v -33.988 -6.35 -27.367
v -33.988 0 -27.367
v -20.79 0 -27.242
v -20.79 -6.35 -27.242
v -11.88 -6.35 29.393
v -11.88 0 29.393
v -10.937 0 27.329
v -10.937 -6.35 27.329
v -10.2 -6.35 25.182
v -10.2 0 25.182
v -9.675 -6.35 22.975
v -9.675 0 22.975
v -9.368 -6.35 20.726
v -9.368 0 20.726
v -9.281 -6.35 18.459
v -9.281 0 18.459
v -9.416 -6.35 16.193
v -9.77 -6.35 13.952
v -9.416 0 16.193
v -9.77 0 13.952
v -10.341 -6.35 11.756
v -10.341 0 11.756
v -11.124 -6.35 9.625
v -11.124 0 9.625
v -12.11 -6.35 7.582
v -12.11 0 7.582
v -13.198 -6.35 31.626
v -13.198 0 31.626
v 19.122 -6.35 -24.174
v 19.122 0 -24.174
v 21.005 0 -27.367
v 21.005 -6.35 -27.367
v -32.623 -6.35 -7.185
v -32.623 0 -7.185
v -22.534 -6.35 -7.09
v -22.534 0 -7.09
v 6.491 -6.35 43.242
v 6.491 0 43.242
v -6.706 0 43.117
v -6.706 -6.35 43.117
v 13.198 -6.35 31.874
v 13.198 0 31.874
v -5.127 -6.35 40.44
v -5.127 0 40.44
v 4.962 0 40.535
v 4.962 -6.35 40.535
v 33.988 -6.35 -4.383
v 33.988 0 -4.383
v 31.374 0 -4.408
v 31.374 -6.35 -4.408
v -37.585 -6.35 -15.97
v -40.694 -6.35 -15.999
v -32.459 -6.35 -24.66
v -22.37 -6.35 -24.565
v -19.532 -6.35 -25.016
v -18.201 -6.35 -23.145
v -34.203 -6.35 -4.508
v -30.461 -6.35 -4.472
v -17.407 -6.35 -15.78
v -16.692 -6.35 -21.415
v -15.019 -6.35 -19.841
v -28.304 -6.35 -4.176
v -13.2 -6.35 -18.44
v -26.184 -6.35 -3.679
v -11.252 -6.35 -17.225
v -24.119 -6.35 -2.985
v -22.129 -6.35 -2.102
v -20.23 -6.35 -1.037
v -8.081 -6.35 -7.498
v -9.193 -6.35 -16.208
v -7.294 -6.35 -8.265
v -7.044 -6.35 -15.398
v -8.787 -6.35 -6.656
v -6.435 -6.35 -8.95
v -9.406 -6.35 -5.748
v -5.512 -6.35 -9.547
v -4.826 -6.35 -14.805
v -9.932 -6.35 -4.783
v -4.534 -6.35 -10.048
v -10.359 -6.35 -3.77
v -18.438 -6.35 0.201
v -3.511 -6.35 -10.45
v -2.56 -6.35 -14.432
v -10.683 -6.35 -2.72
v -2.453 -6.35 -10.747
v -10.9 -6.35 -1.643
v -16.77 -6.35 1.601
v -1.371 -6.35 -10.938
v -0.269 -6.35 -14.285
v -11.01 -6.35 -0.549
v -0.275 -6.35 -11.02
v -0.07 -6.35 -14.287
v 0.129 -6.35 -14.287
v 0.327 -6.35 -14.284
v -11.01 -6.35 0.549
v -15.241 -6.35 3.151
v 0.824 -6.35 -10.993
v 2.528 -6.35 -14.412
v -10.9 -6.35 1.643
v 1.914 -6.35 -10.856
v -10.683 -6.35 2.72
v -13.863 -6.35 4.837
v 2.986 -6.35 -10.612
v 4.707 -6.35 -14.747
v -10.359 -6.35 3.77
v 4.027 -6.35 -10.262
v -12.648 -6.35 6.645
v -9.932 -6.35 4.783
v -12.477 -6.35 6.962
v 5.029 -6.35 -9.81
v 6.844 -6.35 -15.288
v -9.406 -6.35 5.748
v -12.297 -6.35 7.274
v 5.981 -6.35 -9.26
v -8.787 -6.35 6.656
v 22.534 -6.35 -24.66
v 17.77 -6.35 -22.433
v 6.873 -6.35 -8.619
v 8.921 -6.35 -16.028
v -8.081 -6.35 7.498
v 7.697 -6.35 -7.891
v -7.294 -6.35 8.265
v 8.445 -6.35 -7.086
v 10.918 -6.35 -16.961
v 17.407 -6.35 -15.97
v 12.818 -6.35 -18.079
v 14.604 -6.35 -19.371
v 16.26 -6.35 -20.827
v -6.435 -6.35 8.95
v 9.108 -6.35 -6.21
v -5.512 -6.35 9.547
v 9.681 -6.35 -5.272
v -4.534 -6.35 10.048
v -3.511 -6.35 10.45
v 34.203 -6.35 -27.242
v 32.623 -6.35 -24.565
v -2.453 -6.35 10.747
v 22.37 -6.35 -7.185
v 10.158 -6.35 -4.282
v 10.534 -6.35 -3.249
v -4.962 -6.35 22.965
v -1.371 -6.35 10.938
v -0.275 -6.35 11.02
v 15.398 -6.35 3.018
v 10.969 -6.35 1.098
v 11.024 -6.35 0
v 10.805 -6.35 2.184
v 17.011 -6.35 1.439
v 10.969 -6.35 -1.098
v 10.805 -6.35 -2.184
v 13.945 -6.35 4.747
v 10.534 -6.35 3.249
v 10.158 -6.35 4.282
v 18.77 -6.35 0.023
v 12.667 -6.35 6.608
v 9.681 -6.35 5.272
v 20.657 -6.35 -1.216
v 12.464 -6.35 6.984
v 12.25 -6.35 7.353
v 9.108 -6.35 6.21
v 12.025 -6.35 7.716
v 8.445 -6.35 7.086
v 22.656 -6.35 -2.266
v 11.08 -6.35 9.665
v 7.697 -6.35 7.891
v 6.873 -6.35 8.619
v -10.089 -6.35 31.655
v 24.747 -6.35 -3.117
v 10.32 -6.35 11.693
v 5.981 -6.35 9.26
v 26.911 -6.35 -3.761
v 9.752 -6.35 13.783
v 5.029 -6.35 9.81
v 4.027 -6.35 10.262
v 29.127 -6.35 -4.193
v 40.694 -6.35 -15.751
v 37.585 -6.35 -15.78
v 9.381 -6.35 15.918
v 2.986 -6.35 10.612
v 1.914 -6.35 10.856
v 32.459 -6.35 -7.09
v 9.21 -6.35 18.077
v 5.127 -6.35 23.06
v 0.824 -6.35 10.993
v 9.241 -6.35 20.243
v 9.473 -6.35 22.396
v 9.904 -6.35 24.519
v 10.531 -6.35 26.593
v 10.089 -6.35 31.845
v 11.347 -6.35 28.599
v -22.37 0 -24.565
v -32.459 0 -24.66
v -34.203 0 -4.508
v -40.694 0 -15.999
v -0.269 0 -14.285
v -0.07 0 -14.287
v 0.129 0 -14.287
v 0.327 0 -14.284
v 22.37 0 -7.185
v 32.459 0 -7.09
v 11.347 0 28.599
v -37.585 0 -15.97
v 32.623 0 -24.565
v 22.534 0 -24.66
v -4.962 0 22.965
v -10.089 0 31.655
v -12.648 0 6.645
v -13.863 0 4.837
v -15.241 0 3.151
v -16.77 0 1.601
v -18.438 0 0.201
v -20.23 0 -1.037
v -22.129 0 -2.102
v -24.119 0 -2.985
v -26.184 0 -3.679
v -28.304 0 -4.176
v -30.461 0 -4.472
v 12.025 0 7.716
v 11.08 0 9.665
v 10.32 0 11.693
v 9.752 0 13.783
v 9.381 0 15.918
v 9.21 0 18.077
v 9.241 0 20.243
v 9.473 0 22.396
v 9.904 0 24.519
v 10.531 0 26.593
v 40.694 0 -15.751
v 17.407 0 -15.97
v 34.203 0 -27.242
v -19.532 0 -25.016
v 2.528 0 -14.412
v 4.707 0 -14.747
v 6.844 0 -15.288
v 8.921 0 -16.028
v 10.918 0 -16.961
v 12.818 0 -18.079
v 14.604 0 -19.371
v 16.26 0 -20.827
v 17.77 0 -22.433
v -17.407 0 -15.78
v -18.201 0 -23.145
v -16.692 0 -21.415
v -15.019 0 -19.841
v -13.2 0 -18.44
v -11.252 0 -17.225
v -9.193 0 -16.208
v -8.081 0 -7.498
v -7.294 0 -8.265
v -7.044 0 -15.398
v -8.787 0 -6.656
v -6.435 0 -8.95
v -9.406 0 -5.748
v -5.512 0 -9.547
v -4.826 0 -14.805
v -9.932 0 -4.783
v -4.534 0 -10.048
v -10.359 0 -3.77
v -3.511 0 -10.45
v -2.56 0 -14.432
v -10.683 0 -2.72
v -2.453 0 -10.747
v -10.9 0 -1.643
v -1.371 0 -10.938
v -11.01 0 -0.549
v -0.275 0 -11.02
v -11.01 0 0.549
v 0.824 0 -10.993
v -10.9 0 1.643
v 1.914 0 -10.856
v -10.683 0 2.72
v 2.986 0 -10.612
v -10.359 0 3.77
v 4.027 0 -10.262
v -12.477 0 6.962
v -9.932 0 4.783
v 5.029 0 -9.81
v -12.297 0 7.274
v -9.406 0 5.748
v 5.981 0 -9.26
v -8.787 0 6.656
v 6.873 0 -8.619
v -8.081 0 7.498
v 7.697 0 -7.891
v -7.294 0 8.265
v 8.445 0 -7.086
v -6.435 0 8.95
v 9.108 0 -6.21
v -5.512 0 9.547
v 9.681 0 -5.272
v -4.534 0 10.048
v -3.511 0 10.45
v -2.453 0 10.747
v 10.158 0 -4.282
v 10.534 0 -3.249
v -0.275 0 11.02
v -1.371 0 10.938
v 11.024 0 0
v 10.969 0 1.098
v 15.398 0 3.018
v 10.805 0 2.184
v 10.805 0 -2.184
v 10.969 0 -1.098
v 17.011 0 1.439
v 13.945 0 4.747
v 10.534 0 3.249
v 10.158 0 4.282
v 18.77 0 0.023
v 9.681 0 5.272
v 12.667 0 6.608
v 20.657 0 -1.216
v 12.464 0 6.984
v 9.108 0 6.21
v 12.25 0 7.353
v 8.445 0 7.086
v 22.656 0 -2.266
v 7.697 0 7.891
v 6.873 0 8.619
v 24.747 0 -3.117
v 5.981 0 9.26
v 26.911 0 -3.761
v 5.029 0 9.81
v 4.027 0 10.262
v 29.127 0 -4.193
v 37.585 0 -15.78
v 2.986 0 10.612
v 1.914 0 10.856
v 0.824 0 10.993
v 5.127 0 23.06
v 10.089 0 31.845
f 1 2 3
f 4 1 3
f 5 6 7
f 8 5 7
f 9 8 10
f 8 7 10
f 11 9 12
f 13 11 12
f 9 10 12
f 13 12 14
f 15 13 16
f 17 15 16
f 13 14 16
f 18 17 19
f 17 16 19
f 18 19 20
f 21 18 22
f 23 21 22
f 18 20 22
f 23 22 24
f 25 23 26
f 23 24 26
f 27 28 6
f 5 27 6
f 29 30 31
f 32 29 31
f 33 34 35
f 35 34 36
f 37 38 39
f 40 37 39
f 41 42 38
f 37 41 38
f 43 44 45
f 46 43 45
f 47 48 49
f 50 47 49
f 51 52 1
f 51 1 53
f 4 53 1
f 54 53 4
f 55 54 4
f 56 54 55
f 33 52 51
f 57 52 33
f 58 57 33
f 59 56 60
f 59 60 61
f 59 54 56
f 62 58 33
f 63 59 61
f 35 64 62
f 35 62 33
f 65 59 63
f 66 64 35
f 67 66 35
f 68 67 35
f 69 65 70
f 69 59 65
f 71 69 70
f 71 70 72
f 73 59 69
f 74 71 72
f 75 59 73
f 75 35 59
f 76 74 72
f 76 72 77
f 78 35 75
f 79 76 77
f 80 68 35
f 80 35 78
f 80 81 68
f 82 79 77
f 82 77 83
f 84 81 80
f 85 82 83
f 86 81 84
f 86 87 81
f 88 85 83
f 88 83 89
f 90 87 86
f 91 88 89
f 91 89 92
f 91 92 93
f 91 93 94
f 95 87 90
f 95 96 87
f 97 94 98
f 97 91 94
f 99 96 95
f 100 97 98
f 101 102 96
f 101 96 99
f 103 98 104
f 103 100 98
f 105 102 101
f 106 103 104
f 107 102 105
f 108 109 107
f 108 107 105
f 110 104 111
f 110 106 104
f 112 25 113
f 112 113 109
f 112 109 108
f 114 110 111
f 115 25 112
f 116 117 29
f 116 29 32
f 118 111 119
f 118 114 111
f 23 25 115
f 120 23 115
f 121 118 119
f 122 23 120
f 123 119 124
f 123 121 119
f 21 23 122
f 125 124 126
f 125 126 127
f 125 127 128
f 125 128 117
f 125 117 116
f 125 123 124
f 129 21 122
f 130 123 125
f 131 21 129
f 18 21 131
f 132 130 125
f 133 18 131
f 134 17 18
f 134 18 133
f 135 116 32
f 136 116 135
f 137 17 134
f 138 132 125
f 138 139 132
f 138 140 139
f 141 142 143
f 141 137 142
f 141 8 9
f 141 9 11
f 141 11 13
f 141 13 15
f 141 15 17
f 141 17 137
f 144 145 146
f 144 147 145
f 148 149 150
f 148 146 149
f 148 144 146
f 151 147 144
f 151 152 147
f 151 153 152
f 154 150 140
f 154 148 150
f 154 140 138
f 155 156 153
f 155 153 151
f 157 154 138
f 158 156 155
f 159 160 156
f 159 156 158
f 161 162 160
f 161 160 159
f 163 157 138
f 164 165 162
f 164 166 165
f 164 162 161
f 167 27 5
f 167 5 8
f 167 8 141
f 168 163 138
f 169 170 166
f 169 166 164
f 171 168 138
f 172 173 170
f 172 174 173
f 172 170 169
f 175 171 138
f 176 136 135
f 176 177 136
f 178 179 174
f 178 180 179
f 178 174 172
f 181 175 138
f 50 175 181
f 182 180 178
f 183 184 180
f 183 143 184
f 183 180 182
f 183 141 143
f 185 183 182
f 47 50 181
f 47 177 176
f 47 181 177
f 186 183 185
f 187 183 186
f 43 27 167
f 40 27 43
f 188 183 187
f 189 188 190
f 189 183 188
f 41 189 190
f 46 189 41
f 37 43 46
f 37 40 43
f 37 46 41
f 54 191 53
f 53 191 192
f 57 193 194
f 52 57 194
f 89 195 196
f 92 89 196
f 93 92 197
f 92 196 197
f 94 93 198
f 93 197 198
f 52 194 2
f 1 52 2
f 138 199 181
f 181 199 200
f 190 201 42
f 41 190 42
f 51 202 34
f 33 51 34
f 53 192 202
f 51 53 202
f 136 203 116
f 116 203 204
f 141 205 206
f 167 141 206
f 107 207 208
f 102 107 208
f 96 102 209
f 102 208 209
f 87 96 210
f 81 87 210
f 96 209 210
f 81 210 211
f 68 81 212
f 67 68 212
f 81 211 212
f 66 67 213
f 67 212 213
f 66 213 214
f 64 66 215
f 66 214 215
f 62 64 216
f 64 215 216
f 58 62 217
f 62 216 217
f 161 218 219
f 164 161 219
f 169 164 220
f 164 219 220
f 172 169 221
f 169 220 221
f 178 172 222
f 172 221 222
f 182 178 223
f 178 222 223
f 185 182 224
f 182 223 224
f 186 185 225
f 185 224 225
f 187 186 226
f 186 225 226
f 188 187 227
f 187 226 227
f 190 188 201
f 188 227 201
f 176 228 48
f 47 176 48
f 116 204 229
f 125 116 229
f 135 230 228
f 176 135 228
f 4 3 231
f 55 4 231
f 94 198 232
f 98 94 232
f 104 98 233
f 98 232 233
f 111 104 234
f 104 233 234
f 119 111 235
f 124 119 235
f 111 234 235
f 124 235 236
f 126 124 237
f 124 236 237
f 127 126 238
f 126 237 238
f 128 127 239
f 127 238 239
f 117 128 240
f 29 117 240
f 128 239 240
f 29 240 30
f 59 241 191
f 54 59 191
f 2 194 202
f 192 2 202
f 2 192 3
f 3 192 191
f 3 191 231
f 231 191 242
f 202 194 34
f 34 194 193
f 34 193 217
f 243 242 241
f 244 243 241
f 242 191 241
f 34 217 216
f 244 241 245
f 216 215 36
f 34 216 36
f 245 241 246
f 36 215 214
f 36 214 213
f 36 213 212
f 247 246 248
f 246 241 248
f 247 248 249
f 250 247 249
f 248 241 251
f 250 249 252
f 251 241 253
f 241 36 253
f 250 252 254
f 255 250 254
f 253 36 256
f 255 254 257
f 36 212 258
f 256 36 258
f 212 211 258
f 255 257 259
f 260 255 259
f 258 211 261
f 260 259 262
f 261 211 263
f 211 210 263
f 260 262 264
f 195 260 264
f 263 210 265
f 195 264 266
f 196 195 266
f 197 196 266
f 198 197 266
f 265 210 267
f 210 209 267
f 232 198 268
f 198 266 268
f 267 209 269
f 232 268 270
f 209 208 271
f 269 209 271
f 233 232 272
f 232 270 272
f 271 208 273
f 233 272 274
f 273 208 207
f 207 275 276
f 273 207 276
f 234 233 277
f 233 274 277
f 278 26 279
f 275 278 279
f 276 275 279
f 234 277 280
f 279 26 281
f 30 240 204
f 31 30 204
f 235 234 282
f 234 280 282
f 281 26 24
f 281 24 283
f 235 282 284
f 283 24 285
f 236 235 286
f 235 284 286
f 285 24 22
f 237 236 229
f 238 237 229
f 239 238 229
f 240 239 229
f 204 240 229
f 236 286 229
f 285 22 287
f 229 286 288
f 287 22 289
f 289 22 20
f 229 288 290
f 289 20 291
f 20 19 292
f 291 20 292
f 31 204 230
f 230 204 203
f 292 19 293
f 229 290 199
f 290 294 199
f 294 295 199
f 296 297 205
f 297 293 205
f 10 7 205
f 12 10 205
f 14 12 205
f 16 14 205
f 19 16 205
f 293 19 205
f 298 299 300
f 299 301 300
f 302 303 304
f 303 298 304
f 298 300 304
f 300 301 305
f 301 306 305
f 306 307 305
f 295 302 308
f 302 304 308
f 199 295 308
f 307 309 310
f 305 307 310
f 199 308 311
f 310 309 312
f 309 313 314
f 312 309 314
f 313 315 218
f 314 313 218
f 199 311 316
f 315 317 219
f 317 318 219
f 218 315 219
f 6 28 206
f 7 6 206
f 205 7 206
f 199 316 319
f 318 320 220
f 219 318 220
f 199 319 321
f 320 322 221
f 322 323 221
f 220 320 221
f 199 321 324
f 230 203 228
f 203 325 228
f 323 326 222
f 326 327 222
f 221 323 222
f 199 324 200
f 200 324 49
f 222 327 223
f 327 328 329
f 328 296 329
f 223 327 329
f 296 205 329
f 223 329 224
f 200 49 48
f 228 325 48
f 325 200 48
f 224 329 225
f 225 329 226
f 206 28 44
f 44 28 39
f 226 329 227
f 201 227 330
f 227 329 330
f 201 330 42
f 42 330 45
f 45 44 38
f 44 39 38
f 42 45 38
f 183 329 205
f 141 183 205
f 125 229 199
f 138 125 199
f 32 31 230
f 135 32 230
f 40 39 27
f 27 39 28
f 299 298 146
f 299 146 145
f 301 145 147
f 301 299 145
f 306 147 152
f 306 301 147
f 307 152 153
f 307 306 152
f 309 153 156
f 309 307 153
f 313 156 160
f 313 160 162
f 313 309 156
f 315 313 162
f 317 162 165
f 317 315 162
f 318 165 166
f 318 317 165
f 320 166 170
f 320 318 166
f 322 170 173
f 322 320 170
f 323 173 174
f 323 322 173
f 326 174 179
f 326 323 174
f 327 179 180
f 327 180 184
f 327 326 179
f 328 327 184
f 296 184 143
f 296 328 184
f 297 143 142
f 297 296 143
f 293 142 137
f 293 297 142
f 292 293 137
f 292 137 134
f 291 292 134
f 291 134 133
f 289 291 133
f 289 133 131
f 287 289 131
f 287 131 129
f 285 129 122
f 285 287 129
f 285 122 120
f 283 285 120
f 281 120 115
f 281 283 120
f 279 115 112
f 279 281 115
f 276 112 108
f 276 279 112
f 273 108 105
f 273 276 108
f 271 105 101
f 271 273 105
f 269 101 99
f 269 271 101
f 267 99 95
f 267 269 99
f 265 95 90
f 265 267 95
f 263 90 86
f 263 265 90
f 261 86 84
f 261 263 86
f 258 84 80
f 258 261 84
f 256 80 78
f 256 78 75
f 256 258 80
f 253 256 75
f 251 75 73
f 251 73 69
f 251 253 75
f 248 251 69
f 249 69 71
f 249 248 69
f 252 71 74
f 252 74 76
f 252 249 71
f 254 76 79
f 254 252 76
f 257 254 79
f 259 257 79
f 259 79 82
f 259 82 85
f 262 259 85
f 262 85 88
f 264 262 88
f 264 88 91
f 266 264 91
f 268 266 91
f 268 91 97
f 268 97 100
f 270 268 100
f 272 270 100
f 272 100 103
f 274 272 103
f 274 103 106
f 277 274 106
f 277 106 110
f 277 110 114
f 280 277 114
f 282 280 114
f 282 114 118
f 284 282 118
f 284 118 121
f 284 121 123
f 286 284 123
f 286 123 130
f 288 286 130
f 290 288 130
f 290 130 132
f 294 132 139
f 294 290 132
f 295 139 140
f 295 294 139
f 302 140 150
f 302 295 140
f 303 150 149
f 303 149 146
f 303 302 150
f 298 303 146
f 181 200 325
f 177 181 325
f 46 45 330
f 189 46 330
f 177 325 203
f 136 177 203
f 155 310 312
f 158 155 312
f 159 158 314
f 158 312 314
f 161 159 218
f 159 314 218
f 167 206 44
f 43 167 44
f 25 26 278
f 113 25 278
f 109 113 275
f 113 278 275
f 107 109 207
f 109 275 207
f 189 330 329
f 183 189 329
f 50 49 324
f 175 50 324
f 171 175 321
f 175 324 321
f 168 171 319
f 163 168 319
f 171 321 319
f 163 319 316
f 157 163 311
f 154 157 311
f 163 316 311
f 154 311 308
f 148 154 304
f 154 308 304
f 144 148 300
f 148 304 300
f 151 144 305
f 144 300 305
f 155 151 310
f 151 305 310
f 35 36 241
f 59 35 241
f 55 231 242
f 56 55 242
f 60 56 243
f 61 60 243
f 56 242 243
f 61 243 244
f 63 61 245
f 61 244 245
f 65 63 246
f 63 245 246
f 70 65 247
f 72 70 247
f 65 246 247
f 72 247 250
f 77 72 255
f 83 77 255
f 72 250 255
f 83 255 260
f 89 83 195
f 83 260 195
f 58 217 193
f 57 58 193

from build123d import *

# Parameters (mm, degrees)
F0_R     = 11.0236
F1_DEPTH = 6.35


with BuildPart() as f1:
    # F0 (on Front) → F1 (new body)
    with BuildSketch(Plane.XZ):
        with BuildLine():
            ThreePointArc((0.3274680596, -14.2837467396), (10.2179096725, -9.9863395783), (14.2875, 0))
            ThreePointArc((14.2875, 0), (13.8765823163, 3.4019287867), (12.6674657785, 6.6081742563))
            ThreePointArc((12.6674657785, 6.6081742563), (12.3386048381, 7.157527699), (12.0249856082, 7.7157227382))
            ThreePointArc((12.0249856082, 7.7157227382), (-0.0794118424, 14.2872793075), (-12.1100113559, 7.581575114))
            ThreePointArc((-12.1100113559, 7.581575114), (-12.3736819292, 7.1101281538), (-12.6482244827, 6.6449284184))
            ThreePointArc((-12.6482244827, 6.6449284184), (-12.2974900055, -7.2735408032), (-0.2689126433, -14.2849691018))
            ThreePointArc((-0.2689126433, -14.2849691018), (0.0292737936, -14.2824480224), (0.3274680596, -14.2837467396))
        make_face()
        Circle(F0_R, mode=Mode.SUBTRACT)
        with BuildLine():
            ThreePointArc((12.6674657785, 6.6081742563), (13.8765823163, 3.4019287867), (14.2875, 0))
            ThreePointArc((14.2875, 0), (10.2179096725, -9.9863395783), (0.3274680596, -14.2837467396))
            ThreePointArc((0.3274680596, -14.2837467396), (10.9182683676, -16.9609416049), (19.1217645686, -24.1744756619))
            Line((19.1217645686, -24.1744756619), (14.2986624039, -15.99905024))
            Line((14.2986624039, -15.99905024), (20.7900538279, -4.5075300019))
            Line((20.7900538279, -4.5075300019), (31.3741279928, -4.4080458119))
            ThreePointArc((31.3741279928, -4.4080458119), (20.6570695125, -1.2156835719), (12.6674657785, 6.6081742563))
        make_face()
        with BuildLine():
            ThreePointArc((12.0249856082, 7.7157227382), (12.3386048381, 7.157527699), (12.6674657785, 6.6081742563))
            ThreePointArc((12.6674657785, 6.6081742563), (12.3586388725, 7.1691492849), (12.0249856082, 7.7157227382))
        make_face()
        with BuildLine():
            ThreePointArc((-0.2689126433, -14.2849691018), (0.0292840868, -14.2874699892), (0.3274680596, -14.2837467396))
            ThreePointArc((0.3274680596, -14.2837467396), (0.0292737936, -14.2824480224), (-0.2689126433, -14.2849691018))
        make_face()
        with BuildLine():
            ThreePointArc((-12.1100113559, 7.581575114), (-0.0794118424, 14.2872793075), (12.0249856082, 7.7157227382))
            ThreePointArc((12.0249856082, 7.7157227382), (9.2100112148, 18.0768557667), (11.3474304636, 28.5986710771))
            Line((11.3474304636, 28.5986710771), (6.7062527423, 20.3825300019))
            Line((6.7062527423, 20.3825300019), (-6.4913914239, 20.258479762))
            Line((-6.4913914239, 20.258479762), (-11.8801477461, 29.3927203242))
            ThreePointArc((-11.8801477461, 29.3927203242), (-9.2812144735, 18.4585467989), (-12.1100113559, 7.581575114))
        make_face()
        with BuildLine():
            ThreePointArc((33.9876979941, -4.383479762), (32.6812582501, -4.4324944701), (31.3741279928, -4.4080458119))
            Line((31.3741279928, -4.4080458119), (20.7900538279, -4.5075300019))
            Line((20.7900538279, -4.5075300019), (14.2986624039, -15.99905024))
            Line((14.2986624039, -15.99905024), (19.1217645686, -24.1744756619))
            ThreePointArc((19.1217645686, -24.1744756619), (20.1269642499, -25.7329626623), (21.0049151462, -27.366520238))
            Line((21.0049151462, -27.366520238), (34.2025593124, -27.2424699981))
            Line((34.2025593124, -27.2424699981), (40.6939507364, -15.75094976))
            Line((40.6939507364, -15.75094976), (33.9876979941, -4.383479762))
        make_face()
        Polygon((22.5339984594, -24.6596288042), (17.4074408075, -15.9698295168), (22.3697489183, -7.1852007126), (32.4586146809, -7.0903711958), (37.5851723328, -15.7801704832), (32.622864222, -24.5647992874), align=None, mode=Mode.SUBTRACT)
        with BuildLine():
            Line((33.9876979941, -4.383479762), (31.3741279928, -4.4080458119))
            ThreePointArc((31.3741279928, -4.4080458119), (32.6812582501, -4.4324944701), (33.9876979941, -4.383479762))
        make_face()
        with BuildLine():
            ThreePointArc((-19.5323350277, -25.0159672189), (-11.251794814, -17.2249549892), (-0.2689126433, -14.2849691018))
            ThreePointArc((-0.2689126433, -14.2849691018), (-12.2974900055, -7.2735408032), (-12.6482244827, 6.6449284184))
            ThreePointArc((-12.6482244827, 6.6449284184), (-20.2295725455, -1.03712802), (-30.4613844896, -4.4723651173))
            Line((-30.4613844896, -4.4723651173), (-21.0049151462, -4.383479762))
            Line((-21.0049151462, -4.383479762), (-14.2986624039, -15.75094976))
            Line((-14.2986624039, -15.75094976), (-19.5323350277, -25.0159672189))
        make_face()
        with BuildLine():
            ThreePointArc((21.0049151462, -27.366520238), (20.1269642499, -25.7329626623), (19.1217645686, -24.1744756619))
            Line((19.1217645686, -24.1744756619), (21.0049151462, -27.366520238))
        make_face()
        with BuildLine():
            ThreePointArc((-12.6482244827, 6.6449284184), (-12.3736819292, 7.1101281538), (-12.1100113559, 7.581575114))
            ThreePointArc((-12.1100113559, 7.581575114), (-12.3879734912, 7.1183403285), (-12.6482244827, 6.6449284184))
        make_face()
        with BuildLine():
            ThreePointArc((13.1976441662, 31.87405024), (12.2062266956, 30.2738185559), (11.3474304636, 28.5986710771))
            Line((11.3474304636, 28.5986710771), (13.1976441662, 31.87405024))
        make_face()
        with BuildLine():
            Line((6.7062527423, 20.3825300019), (11.3474304636, 28.5986710771))
            ThreePointArc((11.3474304636, 28.5986710771), (12.2062266956, 30.2738185559), (13.1976441662, 31.87405024))
            Line((13.1976441662, 31.87405024), (6.4913914239, 43.241520238))
            Line((6.4913914239, 43.241520238), (-6.7062527423, 43.1174699981))
            Line((-6.7062527423, 43.1174699981), (-13.1976441662, 31.62594976))
            ThreePointArc((-13.1976441662, 31.62594976), (-12.5077667223, 30.5276997715), (-11.8801477461, 29.3927203242))
            Line((-11.8801477461, 29.3927203242), (-6.4913914239, 20.258479762))
            Line((-6.4913914239, 20.258479762), (6.7062527423, 20.3825300019))
        make_face()
        Polygon((-4.9623081108, 22.9653711958), (-10.0888657626, 31.6551704832), (-5.1265576519, 40.4397992874), (4.9623081108, 40.5346288042), (10.0888657626, 31.8448295168), (5.1265576519, 23.0602007126), align=None, mode=Mode.SUBTRACT)
        with BuildLine():
            ThreePointArc((-20.7900538279, -27.2424699981), (-20.1917898783, -26.1119356867), (-19.5323350277, -25.0159672189))
            Line((-19.5323350277, -25.0159672189), (-14.2986624039, -15.75094976))
            Line((-14.2986624039, -15.75094976), (-21.0049151462, -4.383479762))
            Line((-21.0049151462, -4.383479762), (-30.4613844896, -4.4723651173))
            ThreePointArc((-30.4613844896, -4.4723651173), (-32.331264033, -4.5652572938), (-34.2025593124, -4.5075300019))
            Line((-34.2025593124, -4.5075300019), (-40.6939507364, -15.99905024))
            Line((-40.6939507364, -15.99905024), (-33.9876979941, -27.366520238))
            Line((-33.9876979941, -27.366520238), (-20.7900538279, -27.2424699981))
        make_face()
        Polygon((-32.622864222, -7.1852007126), (-22.5339984594, -7.0903711958), (-17.4074408075, -15.7801704832), (-22.3697489183, -24.5647992874), (-32.4586146809, -24.6596288042), (-37.5851723328, -15.9698295168), align=None, mode=Mode.SUBTRACT)
        with BuildLine():
            Line((-20.7900538279, -27.2424699981), (-19.5323350277, -25.0159672189))
            ThreePointArc((-19.5323350277, -25.0159672189), (-20.1917898783, -26.1119356867), (-20.7900538279, -27.2424699981))
        make_face()
        with BuildLine():
            Line((-13.1976441662, 31.62594976), (-11.8801477461, 29.3927203242))
            ThreePointArc((-11.8801477461, 29.3927203242), (-12.5077667223, 30.5276997715), (-13.1976441662, 31.62594976))
        make_face()
        with BuildLine():
            ThreePointArc((-34.2025593124, -4.5075300019), (-32.331264033, -4.5652572938), (-30.4613844896, -4.4723651173))
            Line((-30.4613844896, -4.4723651173), (-34.2025593124, -4.5075300019))
        make_face()
    extrude(amount=F1_DEPTH)


solid = f1.part
